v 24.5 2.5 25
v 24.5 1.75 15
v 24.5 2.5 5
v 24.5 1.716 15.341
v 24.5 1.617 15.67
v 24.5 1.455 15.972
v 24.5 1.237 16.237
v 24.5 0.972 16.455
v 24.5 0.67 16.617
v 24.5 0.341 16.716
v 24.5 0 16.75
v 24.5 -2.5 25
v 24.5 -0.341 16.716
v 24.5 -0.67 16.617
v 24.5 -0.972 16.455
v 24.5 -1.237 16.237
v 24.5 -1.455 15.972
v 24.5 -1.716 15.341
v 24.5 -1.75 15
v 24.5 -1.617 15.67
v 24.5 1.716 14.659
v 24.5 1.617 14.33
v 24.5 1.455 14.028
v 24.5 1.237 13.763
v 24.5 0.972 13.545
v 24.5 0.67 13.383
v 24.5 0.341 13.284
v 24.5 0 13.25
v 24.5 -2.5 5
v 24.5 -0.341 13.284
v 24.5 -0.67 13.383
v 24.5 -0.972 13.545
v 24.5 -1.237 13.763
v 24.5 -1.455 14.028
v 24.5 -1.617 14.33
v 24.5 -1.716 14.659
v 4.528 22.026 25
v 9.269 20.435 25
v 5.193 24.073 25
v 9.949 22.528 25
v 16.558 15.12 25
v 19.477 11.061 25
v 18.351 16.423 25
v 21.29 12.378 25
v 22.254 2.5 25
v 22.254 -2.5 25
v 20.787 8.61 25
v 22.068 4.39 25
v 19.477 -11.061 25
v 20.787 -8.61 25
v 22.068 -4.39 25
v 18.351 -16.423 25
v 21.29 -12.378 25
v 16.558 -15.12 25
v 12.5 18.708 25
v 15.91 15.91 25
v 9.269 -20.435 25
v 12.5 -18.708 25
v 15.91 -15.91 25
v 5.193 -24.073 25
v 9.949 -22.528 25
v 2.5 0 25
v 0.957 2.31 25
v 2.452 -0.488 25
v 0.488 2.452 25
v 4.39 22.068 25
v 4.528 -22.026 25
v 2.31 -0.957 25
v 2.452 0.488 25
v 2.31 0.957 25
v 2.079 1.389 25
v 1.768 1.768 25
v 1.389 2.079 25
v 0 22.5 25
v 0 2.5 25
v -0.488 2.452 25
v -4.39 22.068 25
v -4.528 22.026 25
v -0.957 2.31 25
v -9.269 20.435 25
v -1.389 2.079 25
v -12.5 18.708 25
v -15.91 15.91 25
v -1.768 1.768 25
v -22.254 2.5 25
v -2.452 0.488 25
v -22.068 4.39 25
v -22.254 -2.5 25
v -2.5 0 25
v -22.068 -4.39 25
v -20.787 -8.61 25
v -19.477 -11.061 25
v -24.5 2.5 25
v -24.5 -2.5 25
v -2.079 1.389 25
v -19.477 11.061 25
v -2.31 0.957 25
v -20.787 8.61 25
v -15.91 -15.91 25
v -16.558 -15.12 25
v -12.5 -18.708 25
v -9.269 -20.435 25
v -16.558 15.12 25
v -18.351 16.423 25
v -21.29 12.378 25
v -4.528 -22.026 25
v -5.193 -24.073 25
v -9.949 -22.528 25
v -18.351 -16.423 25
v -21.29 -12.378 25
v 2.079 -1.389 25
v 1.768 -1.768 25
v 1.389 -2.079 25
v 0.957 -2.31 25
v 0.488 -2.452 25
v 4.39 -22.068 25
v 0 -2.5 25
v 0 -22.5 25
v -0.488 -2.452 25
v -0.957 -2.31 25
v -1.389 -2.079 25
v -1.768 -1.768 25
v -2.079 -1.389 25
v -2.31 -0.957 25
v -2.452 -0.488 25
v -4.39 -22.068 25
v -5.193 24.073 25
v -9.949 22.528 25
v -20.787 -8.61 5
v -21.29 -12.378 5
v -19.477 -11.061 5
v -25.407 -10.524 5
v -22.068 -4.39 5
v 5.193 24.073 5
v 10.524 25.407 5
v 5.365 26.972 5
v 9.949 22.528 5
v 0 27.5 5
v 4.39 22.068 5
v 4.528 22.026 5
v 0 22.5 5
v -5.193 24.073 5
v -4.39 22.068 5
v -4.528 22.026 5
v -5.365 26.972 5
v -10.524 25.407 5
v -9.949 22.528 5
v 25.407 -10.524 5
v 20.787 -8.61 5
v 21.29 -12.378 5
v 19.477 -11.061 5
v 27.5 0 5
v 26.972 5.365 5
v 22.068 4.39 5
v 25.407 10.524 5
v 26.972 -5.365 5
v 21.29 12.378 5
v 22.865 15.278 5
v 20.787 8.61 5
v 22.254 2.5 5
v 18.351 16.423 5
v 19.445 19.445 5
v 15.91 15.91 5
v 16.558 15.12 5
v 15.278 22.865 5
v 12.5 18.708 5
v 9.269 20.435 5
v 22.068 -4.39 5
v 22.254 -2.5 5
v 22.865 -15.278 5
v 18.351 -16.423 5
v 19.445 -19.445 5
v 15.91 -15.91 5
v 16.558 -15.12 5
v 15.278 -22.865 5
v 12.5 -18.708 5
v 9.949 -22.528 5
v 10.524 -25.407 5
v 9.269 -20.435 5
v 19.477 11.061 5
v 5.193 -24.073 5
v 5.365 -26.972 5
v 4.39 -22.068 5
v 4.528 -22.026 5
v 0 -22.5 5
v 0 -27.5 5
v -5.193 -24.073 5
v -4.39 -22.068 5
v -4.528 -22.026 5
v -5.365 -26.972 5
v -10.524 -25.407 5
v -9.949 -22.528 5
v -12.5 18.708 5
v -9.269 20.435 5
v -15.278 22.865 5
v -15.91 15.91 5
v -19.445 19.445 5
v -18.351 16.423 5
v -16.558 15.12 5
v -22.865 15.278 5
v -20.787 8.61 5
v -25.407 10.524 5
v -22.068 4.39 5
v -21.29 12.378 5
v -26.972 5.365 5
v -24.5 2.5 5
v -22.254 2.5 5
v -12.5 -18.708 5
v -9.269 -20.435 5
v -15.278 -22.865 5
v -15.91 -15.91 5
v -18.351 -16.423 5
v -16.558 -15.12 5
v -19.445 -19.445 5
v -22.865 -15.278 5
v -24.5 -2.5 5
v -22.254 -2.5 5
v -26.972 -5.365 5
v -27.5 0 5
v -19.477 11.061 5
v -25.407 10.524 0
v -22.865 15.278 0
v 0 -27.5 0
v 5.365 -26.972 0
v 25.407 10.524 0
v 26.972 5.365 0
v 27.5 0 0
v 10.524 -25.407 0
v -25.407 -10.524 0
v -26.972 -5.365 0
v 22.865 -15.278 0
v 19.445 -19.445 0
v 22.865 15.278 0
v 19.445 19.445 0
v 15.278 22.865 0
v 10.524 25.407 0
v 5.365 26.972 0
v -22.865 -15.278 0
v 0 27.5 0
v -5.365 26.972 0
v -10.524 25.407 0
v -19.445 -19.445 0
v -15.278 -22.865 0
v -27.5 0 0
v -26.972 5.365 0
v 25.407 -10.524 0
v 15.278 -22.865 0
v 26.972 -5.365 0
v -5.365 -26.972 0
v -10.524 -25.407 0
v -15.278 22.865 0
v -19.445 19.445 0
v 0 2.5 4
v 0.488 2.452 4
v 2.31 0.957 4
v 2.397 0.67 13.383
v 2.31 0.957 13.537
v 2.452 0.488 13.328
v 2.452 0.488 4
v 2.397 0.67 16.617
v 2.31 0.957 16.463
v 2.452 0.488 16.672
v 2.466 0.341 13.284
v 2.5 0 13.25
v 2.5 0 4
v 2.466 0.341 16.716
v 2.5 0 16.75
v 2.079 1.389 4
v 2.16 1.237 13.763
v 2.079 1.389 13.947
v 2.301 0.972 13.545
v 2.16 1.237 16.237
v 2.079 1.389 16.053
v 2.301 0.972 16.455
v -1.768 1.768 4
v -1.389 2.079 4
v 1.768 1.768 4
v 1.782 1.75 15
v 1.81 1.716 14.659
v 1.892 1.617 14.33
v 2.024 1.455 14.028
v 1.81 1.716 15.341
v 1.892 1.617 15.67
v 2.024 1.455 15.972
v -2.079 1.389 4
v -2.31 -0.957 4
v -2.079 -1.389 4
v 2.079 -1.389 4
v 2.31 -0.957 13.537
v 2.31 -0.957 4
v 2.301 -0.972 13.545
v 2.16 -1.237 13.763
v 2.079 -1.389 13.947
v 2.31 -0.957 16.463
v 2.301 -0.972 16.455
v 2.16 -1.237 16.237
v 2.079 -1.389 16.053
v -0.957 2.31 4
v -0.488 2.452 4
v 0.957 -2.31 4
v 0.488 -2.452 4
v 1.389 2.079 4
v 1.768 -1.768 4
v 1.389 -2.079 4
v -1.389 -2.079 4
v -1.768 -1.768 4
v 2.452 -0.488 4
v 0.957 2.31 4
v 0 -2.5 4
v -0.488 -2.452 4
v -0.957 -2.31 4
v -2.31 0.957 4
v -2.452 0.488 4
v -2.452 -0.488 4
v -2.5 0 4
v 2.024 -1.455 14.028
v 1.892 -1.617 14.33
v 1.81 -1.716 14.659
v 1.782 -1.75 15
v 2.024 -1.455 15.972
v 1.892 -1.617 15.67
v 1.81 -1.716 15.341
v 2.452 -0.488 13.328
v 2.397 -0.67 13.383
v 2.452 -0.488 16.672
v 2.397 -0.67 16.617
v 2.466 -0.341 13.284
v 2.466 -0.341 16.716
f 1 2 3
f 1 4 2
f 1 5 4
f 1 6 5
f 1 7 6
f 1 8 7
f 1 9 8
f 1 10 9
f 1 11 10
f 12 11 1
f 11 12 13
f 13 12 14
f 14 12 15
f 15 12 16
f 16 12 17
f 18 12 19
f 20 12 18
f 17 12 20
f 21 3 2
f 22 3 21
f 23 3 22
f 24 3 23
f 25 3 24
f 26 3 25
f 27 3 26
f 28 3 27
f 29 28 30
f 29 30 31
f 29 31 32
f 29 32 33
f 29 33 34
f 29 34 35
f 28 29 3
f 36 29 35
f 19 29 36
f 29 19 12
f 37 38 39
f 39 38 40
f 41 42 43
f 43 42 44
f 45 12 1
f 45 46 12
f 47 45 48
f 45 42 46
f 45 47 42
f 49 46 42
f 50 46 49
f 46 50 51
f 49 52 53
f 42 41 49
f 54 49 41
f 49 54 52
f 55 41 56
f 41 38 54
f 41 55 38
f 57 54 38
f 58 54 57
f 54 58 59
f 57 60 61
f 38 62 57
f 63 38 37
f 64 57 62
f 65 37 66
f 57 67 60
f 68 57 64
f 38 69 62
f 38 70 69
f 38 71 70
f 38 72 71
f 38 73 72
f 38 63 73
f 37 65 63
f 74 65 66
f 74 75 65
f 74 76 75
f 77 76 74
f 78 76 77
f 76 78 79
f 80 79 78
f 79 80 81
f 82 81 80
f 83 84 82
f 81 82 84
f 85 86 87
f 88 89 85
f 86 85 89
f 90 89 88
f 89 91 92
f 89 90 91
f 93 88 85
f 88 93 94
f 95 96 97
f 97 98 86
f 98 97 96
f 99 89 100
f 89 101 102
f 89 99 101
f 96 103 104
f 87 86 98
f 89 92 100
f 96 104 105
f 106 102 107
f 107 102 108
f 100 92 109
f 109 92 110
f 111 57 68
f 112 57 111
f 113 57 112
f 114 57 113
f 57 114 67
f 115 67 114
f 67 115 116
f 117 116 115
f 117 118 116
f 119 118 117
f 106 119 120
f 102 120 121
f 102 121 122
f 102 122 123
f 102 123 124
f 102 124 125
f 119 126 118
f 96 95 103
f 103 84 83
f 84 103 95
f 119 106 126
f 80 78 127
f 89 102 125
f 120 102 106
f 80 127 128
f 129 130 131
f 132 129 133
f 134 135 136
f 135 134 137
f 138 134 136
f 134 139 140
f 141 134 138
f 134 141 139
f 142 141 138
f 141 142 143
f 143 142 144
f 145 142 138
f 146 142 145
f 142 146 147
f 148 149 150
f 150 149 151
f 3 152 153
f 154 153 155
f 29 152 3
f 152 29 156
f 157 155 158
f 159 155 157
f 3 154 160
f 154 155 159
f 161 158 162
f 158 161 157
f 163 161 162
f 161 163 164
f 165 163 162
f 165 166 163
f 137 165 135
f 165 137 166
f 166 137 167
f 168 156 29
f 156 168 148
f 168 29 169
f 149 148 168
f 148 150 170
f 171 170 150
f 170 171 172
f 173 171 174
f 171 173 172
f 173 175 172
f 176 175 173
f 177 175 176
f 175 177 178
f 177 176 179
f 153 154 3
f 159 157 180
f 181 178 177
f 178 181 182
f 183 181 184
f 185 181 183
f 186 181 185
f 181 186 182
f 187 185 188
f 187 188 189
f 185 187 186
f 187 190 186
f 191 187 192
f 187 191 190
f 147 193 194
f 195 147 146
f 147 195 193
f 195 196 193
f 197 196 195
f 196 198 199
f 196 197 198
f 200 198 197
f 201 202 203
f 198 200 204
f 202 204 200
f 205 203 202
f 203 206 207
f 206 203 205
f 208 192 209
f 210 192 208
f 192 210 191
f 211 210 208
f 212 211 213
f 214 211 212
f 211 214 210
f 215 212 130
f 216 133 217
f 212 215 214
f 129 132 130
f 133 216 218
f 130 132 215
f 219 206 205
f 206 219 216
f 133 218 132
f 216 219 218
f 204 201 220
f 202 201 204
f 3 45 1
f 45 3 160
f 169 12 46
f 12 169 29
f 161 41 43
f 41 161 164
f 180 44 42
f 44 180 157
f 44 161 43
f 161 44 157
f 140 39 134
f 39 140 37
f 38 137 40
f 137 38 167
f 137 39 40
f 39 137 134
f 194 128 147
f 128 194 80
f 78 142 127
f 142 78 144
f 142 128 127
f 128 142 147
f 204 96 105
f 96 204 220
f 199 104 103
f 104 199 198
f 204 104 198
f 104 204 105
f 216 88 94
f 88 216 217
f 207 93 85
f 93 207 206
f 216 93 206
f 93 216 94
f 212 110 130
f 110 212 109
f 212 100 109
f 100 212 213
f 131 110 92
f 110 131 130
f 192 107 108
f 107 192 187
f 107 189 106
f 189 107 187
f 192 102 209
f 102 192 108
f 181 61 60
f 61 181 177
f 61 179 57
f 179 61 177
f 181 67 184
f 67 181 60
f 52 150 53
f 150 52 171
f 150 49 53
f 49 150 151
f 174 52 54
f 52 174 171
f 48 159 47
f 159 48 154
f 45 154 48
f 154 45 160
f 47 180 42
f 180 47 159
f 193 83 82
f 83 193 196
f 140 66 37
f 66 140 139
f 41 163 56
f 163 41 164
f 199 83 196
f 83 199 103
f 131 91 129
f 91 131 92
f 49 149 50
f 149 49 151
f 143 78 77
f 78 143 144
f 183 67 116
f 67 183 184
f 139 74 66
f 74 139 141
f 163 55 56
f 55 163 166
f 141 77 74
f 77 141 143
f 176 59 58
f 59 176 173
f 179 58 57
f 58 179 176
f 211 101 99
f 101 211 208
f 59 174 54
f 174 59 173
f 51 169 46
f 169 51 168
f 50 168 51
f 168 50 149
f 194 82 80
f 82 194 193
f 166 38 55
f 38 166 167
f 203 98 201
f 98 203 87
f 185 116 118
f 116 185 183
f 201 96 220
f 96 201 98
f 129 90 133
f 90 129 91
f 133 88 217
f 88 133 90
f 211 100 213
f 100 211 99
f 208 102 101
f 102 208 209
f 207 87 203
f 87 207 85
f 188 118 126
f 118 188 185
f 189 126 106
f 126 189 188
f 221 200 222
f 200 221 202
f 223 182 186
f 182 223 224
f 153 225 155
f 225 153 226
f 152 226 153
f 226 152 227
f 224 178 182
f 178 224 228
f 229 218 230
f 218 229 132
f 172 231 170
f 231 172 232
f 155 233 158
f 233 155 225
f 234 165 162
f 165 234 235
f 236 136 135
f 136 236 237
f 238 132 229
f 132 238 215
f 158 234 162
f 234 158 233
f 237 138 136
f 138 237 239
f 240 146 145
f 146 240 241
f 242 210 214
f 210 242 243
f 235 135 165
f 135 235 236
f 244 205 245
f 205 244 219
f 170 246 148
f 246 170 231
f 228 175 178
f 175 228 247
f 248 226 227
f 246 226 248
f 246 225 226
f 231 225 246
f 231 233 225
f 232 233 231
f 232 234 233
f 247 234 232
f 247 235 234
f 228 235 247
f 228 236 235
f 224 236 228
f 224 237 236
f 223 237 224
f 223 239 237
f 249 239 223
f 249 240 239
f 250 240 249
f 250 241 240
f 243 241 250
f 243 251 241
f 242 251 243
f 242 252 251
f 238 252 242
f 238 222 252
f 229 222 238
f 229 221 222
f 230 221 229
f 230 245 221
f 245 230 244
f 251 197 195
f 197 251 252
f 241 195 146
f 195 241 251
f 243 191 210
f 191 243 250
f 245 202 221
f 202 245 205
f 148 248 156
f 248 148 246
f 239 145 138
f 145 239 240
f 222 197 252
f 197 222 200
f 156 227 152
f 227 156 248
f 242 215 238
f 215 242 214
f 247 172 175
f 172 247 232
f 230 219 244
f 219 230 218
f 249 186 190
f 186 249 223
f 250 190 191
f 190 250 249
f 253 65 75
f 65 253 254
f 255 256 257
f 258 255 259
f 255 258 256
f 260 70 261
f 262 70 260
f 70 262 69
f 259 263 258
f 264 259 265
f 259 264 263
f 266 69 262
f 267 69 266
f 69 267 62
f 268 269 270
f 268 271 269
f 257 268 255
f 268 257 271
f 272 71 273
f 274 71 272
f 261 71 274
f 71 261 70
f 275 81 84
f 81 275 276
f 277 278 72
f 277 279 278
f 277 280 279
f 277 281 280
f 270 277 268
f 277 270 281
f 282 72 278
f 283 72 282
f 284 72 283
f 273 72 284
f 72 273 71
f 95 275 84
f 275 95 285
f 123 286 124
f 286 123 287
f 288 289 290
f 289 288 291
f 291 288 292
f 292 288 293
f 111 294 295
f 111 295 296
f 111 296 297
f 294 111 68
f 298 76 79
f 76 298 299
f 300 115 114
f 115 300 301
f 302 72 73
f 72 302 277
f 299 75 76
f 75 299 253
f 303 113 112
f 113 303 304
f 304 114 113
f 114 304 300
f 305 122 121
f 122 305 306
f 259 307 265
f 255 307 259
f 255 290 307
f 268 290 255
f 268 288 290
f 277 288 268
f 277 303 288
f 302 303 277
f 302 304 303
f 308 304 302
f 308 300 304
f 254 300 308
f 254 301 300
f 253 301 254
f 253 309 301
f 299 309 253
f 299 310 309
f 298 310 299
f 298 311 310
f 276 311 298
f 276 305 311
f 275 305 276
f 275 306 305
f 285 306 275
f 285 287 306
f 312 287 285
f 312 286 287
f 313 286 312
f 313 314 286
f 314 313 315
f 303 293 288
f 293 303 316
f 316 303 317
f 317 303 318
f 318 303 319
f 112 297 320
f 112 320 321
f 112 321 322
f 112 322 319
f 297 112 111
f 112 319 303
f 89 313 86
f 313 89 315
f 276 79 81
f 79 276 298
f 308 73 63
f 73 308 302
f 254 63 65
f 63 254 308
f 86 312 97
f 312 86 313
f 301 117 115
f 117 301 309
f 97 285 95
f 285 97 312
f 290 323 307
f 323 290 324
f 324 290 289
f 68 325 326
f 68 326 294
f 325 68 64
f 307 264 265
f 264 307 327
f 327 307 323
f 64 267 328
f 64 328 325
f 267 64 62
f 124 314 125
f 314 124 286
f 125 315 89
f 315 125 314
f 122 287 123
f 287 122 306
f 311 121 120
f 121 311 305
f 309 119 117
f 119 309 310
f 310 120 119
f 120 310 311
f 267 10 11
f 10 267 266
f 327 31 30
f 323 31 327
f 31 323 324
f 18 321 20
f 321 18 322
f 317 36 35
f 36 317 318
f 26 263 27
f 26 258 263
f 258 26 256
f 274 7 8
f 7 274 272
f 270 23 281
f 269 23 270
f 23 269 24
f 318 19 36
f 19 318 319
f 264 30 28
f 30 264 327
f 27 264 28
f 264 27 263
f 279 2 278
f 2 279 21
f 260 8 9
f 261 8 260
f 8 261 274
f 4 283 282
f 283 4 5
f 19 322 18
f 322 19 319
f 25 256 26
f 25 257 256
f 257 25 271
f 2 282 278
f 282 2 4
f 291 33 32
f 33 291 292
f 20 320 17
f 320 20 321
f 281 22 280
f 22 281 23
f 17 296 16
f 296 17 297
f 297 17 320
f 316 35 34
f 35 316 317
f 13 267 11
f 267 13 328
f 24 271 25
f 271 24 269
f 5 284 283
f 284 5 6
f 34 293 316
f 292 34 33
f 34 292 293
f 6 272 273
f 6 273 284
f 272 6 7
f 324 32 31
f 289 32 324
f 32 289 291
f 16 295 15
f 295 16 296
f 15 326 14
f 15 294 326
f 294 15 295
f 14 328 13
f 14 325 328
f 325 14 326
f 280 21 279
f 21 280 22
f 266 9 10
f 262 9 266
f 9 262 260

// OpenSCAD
$fn = 32;

// ----------------------------------------------------------------------
// Control knob: skirt knob with grip ribs
// ----------------------------------------------------------------------

// --- parameters (mm) ---
skirt_d = 55;             // skirt diameter
skirt_t = 5;              // skirt thickness
rib_w = 5;                // grip rib width
rib_out = 3;              // grip rib radial protrusion
n_ribs = 10;              // number of grip ribs
knob_d = 45;              // knob body diameter
knob_h = 20;              // knob body height
bore_d = 5;               // shaft bore diameter
set_d = 3.5;              // set screw bore diameter

rib_step = 360 / n_ribs;  // rib angular step
total_h = skirt_t + knob_h;  // overall height

difference() {
  union() {
    translate([0, 0, skirt_t]) cylinder(h = knob_h, d = knob_d);
    cylinder(h = skirt_t, d = skirt_d);
    for (i = [0 : n_ribs - 1])
      rotate([0, 0, i * rib_step])
        translate([knob_d / 2 - 1, -rib_w / 2, skirt_t])
          cube([rib_out, rib_w, knob_h]);
  }
  translate([0, 0, skirt_t - 1]) cylinder(h = knob_h + 2, d = bore_d);
  translate([-1, 0, skirt_t + knob_h / 2]) rotate([0, 90, 0])
    cylinder(h = knob_d / 2 + bore_d / 2 + 2, d = set_d);
}
